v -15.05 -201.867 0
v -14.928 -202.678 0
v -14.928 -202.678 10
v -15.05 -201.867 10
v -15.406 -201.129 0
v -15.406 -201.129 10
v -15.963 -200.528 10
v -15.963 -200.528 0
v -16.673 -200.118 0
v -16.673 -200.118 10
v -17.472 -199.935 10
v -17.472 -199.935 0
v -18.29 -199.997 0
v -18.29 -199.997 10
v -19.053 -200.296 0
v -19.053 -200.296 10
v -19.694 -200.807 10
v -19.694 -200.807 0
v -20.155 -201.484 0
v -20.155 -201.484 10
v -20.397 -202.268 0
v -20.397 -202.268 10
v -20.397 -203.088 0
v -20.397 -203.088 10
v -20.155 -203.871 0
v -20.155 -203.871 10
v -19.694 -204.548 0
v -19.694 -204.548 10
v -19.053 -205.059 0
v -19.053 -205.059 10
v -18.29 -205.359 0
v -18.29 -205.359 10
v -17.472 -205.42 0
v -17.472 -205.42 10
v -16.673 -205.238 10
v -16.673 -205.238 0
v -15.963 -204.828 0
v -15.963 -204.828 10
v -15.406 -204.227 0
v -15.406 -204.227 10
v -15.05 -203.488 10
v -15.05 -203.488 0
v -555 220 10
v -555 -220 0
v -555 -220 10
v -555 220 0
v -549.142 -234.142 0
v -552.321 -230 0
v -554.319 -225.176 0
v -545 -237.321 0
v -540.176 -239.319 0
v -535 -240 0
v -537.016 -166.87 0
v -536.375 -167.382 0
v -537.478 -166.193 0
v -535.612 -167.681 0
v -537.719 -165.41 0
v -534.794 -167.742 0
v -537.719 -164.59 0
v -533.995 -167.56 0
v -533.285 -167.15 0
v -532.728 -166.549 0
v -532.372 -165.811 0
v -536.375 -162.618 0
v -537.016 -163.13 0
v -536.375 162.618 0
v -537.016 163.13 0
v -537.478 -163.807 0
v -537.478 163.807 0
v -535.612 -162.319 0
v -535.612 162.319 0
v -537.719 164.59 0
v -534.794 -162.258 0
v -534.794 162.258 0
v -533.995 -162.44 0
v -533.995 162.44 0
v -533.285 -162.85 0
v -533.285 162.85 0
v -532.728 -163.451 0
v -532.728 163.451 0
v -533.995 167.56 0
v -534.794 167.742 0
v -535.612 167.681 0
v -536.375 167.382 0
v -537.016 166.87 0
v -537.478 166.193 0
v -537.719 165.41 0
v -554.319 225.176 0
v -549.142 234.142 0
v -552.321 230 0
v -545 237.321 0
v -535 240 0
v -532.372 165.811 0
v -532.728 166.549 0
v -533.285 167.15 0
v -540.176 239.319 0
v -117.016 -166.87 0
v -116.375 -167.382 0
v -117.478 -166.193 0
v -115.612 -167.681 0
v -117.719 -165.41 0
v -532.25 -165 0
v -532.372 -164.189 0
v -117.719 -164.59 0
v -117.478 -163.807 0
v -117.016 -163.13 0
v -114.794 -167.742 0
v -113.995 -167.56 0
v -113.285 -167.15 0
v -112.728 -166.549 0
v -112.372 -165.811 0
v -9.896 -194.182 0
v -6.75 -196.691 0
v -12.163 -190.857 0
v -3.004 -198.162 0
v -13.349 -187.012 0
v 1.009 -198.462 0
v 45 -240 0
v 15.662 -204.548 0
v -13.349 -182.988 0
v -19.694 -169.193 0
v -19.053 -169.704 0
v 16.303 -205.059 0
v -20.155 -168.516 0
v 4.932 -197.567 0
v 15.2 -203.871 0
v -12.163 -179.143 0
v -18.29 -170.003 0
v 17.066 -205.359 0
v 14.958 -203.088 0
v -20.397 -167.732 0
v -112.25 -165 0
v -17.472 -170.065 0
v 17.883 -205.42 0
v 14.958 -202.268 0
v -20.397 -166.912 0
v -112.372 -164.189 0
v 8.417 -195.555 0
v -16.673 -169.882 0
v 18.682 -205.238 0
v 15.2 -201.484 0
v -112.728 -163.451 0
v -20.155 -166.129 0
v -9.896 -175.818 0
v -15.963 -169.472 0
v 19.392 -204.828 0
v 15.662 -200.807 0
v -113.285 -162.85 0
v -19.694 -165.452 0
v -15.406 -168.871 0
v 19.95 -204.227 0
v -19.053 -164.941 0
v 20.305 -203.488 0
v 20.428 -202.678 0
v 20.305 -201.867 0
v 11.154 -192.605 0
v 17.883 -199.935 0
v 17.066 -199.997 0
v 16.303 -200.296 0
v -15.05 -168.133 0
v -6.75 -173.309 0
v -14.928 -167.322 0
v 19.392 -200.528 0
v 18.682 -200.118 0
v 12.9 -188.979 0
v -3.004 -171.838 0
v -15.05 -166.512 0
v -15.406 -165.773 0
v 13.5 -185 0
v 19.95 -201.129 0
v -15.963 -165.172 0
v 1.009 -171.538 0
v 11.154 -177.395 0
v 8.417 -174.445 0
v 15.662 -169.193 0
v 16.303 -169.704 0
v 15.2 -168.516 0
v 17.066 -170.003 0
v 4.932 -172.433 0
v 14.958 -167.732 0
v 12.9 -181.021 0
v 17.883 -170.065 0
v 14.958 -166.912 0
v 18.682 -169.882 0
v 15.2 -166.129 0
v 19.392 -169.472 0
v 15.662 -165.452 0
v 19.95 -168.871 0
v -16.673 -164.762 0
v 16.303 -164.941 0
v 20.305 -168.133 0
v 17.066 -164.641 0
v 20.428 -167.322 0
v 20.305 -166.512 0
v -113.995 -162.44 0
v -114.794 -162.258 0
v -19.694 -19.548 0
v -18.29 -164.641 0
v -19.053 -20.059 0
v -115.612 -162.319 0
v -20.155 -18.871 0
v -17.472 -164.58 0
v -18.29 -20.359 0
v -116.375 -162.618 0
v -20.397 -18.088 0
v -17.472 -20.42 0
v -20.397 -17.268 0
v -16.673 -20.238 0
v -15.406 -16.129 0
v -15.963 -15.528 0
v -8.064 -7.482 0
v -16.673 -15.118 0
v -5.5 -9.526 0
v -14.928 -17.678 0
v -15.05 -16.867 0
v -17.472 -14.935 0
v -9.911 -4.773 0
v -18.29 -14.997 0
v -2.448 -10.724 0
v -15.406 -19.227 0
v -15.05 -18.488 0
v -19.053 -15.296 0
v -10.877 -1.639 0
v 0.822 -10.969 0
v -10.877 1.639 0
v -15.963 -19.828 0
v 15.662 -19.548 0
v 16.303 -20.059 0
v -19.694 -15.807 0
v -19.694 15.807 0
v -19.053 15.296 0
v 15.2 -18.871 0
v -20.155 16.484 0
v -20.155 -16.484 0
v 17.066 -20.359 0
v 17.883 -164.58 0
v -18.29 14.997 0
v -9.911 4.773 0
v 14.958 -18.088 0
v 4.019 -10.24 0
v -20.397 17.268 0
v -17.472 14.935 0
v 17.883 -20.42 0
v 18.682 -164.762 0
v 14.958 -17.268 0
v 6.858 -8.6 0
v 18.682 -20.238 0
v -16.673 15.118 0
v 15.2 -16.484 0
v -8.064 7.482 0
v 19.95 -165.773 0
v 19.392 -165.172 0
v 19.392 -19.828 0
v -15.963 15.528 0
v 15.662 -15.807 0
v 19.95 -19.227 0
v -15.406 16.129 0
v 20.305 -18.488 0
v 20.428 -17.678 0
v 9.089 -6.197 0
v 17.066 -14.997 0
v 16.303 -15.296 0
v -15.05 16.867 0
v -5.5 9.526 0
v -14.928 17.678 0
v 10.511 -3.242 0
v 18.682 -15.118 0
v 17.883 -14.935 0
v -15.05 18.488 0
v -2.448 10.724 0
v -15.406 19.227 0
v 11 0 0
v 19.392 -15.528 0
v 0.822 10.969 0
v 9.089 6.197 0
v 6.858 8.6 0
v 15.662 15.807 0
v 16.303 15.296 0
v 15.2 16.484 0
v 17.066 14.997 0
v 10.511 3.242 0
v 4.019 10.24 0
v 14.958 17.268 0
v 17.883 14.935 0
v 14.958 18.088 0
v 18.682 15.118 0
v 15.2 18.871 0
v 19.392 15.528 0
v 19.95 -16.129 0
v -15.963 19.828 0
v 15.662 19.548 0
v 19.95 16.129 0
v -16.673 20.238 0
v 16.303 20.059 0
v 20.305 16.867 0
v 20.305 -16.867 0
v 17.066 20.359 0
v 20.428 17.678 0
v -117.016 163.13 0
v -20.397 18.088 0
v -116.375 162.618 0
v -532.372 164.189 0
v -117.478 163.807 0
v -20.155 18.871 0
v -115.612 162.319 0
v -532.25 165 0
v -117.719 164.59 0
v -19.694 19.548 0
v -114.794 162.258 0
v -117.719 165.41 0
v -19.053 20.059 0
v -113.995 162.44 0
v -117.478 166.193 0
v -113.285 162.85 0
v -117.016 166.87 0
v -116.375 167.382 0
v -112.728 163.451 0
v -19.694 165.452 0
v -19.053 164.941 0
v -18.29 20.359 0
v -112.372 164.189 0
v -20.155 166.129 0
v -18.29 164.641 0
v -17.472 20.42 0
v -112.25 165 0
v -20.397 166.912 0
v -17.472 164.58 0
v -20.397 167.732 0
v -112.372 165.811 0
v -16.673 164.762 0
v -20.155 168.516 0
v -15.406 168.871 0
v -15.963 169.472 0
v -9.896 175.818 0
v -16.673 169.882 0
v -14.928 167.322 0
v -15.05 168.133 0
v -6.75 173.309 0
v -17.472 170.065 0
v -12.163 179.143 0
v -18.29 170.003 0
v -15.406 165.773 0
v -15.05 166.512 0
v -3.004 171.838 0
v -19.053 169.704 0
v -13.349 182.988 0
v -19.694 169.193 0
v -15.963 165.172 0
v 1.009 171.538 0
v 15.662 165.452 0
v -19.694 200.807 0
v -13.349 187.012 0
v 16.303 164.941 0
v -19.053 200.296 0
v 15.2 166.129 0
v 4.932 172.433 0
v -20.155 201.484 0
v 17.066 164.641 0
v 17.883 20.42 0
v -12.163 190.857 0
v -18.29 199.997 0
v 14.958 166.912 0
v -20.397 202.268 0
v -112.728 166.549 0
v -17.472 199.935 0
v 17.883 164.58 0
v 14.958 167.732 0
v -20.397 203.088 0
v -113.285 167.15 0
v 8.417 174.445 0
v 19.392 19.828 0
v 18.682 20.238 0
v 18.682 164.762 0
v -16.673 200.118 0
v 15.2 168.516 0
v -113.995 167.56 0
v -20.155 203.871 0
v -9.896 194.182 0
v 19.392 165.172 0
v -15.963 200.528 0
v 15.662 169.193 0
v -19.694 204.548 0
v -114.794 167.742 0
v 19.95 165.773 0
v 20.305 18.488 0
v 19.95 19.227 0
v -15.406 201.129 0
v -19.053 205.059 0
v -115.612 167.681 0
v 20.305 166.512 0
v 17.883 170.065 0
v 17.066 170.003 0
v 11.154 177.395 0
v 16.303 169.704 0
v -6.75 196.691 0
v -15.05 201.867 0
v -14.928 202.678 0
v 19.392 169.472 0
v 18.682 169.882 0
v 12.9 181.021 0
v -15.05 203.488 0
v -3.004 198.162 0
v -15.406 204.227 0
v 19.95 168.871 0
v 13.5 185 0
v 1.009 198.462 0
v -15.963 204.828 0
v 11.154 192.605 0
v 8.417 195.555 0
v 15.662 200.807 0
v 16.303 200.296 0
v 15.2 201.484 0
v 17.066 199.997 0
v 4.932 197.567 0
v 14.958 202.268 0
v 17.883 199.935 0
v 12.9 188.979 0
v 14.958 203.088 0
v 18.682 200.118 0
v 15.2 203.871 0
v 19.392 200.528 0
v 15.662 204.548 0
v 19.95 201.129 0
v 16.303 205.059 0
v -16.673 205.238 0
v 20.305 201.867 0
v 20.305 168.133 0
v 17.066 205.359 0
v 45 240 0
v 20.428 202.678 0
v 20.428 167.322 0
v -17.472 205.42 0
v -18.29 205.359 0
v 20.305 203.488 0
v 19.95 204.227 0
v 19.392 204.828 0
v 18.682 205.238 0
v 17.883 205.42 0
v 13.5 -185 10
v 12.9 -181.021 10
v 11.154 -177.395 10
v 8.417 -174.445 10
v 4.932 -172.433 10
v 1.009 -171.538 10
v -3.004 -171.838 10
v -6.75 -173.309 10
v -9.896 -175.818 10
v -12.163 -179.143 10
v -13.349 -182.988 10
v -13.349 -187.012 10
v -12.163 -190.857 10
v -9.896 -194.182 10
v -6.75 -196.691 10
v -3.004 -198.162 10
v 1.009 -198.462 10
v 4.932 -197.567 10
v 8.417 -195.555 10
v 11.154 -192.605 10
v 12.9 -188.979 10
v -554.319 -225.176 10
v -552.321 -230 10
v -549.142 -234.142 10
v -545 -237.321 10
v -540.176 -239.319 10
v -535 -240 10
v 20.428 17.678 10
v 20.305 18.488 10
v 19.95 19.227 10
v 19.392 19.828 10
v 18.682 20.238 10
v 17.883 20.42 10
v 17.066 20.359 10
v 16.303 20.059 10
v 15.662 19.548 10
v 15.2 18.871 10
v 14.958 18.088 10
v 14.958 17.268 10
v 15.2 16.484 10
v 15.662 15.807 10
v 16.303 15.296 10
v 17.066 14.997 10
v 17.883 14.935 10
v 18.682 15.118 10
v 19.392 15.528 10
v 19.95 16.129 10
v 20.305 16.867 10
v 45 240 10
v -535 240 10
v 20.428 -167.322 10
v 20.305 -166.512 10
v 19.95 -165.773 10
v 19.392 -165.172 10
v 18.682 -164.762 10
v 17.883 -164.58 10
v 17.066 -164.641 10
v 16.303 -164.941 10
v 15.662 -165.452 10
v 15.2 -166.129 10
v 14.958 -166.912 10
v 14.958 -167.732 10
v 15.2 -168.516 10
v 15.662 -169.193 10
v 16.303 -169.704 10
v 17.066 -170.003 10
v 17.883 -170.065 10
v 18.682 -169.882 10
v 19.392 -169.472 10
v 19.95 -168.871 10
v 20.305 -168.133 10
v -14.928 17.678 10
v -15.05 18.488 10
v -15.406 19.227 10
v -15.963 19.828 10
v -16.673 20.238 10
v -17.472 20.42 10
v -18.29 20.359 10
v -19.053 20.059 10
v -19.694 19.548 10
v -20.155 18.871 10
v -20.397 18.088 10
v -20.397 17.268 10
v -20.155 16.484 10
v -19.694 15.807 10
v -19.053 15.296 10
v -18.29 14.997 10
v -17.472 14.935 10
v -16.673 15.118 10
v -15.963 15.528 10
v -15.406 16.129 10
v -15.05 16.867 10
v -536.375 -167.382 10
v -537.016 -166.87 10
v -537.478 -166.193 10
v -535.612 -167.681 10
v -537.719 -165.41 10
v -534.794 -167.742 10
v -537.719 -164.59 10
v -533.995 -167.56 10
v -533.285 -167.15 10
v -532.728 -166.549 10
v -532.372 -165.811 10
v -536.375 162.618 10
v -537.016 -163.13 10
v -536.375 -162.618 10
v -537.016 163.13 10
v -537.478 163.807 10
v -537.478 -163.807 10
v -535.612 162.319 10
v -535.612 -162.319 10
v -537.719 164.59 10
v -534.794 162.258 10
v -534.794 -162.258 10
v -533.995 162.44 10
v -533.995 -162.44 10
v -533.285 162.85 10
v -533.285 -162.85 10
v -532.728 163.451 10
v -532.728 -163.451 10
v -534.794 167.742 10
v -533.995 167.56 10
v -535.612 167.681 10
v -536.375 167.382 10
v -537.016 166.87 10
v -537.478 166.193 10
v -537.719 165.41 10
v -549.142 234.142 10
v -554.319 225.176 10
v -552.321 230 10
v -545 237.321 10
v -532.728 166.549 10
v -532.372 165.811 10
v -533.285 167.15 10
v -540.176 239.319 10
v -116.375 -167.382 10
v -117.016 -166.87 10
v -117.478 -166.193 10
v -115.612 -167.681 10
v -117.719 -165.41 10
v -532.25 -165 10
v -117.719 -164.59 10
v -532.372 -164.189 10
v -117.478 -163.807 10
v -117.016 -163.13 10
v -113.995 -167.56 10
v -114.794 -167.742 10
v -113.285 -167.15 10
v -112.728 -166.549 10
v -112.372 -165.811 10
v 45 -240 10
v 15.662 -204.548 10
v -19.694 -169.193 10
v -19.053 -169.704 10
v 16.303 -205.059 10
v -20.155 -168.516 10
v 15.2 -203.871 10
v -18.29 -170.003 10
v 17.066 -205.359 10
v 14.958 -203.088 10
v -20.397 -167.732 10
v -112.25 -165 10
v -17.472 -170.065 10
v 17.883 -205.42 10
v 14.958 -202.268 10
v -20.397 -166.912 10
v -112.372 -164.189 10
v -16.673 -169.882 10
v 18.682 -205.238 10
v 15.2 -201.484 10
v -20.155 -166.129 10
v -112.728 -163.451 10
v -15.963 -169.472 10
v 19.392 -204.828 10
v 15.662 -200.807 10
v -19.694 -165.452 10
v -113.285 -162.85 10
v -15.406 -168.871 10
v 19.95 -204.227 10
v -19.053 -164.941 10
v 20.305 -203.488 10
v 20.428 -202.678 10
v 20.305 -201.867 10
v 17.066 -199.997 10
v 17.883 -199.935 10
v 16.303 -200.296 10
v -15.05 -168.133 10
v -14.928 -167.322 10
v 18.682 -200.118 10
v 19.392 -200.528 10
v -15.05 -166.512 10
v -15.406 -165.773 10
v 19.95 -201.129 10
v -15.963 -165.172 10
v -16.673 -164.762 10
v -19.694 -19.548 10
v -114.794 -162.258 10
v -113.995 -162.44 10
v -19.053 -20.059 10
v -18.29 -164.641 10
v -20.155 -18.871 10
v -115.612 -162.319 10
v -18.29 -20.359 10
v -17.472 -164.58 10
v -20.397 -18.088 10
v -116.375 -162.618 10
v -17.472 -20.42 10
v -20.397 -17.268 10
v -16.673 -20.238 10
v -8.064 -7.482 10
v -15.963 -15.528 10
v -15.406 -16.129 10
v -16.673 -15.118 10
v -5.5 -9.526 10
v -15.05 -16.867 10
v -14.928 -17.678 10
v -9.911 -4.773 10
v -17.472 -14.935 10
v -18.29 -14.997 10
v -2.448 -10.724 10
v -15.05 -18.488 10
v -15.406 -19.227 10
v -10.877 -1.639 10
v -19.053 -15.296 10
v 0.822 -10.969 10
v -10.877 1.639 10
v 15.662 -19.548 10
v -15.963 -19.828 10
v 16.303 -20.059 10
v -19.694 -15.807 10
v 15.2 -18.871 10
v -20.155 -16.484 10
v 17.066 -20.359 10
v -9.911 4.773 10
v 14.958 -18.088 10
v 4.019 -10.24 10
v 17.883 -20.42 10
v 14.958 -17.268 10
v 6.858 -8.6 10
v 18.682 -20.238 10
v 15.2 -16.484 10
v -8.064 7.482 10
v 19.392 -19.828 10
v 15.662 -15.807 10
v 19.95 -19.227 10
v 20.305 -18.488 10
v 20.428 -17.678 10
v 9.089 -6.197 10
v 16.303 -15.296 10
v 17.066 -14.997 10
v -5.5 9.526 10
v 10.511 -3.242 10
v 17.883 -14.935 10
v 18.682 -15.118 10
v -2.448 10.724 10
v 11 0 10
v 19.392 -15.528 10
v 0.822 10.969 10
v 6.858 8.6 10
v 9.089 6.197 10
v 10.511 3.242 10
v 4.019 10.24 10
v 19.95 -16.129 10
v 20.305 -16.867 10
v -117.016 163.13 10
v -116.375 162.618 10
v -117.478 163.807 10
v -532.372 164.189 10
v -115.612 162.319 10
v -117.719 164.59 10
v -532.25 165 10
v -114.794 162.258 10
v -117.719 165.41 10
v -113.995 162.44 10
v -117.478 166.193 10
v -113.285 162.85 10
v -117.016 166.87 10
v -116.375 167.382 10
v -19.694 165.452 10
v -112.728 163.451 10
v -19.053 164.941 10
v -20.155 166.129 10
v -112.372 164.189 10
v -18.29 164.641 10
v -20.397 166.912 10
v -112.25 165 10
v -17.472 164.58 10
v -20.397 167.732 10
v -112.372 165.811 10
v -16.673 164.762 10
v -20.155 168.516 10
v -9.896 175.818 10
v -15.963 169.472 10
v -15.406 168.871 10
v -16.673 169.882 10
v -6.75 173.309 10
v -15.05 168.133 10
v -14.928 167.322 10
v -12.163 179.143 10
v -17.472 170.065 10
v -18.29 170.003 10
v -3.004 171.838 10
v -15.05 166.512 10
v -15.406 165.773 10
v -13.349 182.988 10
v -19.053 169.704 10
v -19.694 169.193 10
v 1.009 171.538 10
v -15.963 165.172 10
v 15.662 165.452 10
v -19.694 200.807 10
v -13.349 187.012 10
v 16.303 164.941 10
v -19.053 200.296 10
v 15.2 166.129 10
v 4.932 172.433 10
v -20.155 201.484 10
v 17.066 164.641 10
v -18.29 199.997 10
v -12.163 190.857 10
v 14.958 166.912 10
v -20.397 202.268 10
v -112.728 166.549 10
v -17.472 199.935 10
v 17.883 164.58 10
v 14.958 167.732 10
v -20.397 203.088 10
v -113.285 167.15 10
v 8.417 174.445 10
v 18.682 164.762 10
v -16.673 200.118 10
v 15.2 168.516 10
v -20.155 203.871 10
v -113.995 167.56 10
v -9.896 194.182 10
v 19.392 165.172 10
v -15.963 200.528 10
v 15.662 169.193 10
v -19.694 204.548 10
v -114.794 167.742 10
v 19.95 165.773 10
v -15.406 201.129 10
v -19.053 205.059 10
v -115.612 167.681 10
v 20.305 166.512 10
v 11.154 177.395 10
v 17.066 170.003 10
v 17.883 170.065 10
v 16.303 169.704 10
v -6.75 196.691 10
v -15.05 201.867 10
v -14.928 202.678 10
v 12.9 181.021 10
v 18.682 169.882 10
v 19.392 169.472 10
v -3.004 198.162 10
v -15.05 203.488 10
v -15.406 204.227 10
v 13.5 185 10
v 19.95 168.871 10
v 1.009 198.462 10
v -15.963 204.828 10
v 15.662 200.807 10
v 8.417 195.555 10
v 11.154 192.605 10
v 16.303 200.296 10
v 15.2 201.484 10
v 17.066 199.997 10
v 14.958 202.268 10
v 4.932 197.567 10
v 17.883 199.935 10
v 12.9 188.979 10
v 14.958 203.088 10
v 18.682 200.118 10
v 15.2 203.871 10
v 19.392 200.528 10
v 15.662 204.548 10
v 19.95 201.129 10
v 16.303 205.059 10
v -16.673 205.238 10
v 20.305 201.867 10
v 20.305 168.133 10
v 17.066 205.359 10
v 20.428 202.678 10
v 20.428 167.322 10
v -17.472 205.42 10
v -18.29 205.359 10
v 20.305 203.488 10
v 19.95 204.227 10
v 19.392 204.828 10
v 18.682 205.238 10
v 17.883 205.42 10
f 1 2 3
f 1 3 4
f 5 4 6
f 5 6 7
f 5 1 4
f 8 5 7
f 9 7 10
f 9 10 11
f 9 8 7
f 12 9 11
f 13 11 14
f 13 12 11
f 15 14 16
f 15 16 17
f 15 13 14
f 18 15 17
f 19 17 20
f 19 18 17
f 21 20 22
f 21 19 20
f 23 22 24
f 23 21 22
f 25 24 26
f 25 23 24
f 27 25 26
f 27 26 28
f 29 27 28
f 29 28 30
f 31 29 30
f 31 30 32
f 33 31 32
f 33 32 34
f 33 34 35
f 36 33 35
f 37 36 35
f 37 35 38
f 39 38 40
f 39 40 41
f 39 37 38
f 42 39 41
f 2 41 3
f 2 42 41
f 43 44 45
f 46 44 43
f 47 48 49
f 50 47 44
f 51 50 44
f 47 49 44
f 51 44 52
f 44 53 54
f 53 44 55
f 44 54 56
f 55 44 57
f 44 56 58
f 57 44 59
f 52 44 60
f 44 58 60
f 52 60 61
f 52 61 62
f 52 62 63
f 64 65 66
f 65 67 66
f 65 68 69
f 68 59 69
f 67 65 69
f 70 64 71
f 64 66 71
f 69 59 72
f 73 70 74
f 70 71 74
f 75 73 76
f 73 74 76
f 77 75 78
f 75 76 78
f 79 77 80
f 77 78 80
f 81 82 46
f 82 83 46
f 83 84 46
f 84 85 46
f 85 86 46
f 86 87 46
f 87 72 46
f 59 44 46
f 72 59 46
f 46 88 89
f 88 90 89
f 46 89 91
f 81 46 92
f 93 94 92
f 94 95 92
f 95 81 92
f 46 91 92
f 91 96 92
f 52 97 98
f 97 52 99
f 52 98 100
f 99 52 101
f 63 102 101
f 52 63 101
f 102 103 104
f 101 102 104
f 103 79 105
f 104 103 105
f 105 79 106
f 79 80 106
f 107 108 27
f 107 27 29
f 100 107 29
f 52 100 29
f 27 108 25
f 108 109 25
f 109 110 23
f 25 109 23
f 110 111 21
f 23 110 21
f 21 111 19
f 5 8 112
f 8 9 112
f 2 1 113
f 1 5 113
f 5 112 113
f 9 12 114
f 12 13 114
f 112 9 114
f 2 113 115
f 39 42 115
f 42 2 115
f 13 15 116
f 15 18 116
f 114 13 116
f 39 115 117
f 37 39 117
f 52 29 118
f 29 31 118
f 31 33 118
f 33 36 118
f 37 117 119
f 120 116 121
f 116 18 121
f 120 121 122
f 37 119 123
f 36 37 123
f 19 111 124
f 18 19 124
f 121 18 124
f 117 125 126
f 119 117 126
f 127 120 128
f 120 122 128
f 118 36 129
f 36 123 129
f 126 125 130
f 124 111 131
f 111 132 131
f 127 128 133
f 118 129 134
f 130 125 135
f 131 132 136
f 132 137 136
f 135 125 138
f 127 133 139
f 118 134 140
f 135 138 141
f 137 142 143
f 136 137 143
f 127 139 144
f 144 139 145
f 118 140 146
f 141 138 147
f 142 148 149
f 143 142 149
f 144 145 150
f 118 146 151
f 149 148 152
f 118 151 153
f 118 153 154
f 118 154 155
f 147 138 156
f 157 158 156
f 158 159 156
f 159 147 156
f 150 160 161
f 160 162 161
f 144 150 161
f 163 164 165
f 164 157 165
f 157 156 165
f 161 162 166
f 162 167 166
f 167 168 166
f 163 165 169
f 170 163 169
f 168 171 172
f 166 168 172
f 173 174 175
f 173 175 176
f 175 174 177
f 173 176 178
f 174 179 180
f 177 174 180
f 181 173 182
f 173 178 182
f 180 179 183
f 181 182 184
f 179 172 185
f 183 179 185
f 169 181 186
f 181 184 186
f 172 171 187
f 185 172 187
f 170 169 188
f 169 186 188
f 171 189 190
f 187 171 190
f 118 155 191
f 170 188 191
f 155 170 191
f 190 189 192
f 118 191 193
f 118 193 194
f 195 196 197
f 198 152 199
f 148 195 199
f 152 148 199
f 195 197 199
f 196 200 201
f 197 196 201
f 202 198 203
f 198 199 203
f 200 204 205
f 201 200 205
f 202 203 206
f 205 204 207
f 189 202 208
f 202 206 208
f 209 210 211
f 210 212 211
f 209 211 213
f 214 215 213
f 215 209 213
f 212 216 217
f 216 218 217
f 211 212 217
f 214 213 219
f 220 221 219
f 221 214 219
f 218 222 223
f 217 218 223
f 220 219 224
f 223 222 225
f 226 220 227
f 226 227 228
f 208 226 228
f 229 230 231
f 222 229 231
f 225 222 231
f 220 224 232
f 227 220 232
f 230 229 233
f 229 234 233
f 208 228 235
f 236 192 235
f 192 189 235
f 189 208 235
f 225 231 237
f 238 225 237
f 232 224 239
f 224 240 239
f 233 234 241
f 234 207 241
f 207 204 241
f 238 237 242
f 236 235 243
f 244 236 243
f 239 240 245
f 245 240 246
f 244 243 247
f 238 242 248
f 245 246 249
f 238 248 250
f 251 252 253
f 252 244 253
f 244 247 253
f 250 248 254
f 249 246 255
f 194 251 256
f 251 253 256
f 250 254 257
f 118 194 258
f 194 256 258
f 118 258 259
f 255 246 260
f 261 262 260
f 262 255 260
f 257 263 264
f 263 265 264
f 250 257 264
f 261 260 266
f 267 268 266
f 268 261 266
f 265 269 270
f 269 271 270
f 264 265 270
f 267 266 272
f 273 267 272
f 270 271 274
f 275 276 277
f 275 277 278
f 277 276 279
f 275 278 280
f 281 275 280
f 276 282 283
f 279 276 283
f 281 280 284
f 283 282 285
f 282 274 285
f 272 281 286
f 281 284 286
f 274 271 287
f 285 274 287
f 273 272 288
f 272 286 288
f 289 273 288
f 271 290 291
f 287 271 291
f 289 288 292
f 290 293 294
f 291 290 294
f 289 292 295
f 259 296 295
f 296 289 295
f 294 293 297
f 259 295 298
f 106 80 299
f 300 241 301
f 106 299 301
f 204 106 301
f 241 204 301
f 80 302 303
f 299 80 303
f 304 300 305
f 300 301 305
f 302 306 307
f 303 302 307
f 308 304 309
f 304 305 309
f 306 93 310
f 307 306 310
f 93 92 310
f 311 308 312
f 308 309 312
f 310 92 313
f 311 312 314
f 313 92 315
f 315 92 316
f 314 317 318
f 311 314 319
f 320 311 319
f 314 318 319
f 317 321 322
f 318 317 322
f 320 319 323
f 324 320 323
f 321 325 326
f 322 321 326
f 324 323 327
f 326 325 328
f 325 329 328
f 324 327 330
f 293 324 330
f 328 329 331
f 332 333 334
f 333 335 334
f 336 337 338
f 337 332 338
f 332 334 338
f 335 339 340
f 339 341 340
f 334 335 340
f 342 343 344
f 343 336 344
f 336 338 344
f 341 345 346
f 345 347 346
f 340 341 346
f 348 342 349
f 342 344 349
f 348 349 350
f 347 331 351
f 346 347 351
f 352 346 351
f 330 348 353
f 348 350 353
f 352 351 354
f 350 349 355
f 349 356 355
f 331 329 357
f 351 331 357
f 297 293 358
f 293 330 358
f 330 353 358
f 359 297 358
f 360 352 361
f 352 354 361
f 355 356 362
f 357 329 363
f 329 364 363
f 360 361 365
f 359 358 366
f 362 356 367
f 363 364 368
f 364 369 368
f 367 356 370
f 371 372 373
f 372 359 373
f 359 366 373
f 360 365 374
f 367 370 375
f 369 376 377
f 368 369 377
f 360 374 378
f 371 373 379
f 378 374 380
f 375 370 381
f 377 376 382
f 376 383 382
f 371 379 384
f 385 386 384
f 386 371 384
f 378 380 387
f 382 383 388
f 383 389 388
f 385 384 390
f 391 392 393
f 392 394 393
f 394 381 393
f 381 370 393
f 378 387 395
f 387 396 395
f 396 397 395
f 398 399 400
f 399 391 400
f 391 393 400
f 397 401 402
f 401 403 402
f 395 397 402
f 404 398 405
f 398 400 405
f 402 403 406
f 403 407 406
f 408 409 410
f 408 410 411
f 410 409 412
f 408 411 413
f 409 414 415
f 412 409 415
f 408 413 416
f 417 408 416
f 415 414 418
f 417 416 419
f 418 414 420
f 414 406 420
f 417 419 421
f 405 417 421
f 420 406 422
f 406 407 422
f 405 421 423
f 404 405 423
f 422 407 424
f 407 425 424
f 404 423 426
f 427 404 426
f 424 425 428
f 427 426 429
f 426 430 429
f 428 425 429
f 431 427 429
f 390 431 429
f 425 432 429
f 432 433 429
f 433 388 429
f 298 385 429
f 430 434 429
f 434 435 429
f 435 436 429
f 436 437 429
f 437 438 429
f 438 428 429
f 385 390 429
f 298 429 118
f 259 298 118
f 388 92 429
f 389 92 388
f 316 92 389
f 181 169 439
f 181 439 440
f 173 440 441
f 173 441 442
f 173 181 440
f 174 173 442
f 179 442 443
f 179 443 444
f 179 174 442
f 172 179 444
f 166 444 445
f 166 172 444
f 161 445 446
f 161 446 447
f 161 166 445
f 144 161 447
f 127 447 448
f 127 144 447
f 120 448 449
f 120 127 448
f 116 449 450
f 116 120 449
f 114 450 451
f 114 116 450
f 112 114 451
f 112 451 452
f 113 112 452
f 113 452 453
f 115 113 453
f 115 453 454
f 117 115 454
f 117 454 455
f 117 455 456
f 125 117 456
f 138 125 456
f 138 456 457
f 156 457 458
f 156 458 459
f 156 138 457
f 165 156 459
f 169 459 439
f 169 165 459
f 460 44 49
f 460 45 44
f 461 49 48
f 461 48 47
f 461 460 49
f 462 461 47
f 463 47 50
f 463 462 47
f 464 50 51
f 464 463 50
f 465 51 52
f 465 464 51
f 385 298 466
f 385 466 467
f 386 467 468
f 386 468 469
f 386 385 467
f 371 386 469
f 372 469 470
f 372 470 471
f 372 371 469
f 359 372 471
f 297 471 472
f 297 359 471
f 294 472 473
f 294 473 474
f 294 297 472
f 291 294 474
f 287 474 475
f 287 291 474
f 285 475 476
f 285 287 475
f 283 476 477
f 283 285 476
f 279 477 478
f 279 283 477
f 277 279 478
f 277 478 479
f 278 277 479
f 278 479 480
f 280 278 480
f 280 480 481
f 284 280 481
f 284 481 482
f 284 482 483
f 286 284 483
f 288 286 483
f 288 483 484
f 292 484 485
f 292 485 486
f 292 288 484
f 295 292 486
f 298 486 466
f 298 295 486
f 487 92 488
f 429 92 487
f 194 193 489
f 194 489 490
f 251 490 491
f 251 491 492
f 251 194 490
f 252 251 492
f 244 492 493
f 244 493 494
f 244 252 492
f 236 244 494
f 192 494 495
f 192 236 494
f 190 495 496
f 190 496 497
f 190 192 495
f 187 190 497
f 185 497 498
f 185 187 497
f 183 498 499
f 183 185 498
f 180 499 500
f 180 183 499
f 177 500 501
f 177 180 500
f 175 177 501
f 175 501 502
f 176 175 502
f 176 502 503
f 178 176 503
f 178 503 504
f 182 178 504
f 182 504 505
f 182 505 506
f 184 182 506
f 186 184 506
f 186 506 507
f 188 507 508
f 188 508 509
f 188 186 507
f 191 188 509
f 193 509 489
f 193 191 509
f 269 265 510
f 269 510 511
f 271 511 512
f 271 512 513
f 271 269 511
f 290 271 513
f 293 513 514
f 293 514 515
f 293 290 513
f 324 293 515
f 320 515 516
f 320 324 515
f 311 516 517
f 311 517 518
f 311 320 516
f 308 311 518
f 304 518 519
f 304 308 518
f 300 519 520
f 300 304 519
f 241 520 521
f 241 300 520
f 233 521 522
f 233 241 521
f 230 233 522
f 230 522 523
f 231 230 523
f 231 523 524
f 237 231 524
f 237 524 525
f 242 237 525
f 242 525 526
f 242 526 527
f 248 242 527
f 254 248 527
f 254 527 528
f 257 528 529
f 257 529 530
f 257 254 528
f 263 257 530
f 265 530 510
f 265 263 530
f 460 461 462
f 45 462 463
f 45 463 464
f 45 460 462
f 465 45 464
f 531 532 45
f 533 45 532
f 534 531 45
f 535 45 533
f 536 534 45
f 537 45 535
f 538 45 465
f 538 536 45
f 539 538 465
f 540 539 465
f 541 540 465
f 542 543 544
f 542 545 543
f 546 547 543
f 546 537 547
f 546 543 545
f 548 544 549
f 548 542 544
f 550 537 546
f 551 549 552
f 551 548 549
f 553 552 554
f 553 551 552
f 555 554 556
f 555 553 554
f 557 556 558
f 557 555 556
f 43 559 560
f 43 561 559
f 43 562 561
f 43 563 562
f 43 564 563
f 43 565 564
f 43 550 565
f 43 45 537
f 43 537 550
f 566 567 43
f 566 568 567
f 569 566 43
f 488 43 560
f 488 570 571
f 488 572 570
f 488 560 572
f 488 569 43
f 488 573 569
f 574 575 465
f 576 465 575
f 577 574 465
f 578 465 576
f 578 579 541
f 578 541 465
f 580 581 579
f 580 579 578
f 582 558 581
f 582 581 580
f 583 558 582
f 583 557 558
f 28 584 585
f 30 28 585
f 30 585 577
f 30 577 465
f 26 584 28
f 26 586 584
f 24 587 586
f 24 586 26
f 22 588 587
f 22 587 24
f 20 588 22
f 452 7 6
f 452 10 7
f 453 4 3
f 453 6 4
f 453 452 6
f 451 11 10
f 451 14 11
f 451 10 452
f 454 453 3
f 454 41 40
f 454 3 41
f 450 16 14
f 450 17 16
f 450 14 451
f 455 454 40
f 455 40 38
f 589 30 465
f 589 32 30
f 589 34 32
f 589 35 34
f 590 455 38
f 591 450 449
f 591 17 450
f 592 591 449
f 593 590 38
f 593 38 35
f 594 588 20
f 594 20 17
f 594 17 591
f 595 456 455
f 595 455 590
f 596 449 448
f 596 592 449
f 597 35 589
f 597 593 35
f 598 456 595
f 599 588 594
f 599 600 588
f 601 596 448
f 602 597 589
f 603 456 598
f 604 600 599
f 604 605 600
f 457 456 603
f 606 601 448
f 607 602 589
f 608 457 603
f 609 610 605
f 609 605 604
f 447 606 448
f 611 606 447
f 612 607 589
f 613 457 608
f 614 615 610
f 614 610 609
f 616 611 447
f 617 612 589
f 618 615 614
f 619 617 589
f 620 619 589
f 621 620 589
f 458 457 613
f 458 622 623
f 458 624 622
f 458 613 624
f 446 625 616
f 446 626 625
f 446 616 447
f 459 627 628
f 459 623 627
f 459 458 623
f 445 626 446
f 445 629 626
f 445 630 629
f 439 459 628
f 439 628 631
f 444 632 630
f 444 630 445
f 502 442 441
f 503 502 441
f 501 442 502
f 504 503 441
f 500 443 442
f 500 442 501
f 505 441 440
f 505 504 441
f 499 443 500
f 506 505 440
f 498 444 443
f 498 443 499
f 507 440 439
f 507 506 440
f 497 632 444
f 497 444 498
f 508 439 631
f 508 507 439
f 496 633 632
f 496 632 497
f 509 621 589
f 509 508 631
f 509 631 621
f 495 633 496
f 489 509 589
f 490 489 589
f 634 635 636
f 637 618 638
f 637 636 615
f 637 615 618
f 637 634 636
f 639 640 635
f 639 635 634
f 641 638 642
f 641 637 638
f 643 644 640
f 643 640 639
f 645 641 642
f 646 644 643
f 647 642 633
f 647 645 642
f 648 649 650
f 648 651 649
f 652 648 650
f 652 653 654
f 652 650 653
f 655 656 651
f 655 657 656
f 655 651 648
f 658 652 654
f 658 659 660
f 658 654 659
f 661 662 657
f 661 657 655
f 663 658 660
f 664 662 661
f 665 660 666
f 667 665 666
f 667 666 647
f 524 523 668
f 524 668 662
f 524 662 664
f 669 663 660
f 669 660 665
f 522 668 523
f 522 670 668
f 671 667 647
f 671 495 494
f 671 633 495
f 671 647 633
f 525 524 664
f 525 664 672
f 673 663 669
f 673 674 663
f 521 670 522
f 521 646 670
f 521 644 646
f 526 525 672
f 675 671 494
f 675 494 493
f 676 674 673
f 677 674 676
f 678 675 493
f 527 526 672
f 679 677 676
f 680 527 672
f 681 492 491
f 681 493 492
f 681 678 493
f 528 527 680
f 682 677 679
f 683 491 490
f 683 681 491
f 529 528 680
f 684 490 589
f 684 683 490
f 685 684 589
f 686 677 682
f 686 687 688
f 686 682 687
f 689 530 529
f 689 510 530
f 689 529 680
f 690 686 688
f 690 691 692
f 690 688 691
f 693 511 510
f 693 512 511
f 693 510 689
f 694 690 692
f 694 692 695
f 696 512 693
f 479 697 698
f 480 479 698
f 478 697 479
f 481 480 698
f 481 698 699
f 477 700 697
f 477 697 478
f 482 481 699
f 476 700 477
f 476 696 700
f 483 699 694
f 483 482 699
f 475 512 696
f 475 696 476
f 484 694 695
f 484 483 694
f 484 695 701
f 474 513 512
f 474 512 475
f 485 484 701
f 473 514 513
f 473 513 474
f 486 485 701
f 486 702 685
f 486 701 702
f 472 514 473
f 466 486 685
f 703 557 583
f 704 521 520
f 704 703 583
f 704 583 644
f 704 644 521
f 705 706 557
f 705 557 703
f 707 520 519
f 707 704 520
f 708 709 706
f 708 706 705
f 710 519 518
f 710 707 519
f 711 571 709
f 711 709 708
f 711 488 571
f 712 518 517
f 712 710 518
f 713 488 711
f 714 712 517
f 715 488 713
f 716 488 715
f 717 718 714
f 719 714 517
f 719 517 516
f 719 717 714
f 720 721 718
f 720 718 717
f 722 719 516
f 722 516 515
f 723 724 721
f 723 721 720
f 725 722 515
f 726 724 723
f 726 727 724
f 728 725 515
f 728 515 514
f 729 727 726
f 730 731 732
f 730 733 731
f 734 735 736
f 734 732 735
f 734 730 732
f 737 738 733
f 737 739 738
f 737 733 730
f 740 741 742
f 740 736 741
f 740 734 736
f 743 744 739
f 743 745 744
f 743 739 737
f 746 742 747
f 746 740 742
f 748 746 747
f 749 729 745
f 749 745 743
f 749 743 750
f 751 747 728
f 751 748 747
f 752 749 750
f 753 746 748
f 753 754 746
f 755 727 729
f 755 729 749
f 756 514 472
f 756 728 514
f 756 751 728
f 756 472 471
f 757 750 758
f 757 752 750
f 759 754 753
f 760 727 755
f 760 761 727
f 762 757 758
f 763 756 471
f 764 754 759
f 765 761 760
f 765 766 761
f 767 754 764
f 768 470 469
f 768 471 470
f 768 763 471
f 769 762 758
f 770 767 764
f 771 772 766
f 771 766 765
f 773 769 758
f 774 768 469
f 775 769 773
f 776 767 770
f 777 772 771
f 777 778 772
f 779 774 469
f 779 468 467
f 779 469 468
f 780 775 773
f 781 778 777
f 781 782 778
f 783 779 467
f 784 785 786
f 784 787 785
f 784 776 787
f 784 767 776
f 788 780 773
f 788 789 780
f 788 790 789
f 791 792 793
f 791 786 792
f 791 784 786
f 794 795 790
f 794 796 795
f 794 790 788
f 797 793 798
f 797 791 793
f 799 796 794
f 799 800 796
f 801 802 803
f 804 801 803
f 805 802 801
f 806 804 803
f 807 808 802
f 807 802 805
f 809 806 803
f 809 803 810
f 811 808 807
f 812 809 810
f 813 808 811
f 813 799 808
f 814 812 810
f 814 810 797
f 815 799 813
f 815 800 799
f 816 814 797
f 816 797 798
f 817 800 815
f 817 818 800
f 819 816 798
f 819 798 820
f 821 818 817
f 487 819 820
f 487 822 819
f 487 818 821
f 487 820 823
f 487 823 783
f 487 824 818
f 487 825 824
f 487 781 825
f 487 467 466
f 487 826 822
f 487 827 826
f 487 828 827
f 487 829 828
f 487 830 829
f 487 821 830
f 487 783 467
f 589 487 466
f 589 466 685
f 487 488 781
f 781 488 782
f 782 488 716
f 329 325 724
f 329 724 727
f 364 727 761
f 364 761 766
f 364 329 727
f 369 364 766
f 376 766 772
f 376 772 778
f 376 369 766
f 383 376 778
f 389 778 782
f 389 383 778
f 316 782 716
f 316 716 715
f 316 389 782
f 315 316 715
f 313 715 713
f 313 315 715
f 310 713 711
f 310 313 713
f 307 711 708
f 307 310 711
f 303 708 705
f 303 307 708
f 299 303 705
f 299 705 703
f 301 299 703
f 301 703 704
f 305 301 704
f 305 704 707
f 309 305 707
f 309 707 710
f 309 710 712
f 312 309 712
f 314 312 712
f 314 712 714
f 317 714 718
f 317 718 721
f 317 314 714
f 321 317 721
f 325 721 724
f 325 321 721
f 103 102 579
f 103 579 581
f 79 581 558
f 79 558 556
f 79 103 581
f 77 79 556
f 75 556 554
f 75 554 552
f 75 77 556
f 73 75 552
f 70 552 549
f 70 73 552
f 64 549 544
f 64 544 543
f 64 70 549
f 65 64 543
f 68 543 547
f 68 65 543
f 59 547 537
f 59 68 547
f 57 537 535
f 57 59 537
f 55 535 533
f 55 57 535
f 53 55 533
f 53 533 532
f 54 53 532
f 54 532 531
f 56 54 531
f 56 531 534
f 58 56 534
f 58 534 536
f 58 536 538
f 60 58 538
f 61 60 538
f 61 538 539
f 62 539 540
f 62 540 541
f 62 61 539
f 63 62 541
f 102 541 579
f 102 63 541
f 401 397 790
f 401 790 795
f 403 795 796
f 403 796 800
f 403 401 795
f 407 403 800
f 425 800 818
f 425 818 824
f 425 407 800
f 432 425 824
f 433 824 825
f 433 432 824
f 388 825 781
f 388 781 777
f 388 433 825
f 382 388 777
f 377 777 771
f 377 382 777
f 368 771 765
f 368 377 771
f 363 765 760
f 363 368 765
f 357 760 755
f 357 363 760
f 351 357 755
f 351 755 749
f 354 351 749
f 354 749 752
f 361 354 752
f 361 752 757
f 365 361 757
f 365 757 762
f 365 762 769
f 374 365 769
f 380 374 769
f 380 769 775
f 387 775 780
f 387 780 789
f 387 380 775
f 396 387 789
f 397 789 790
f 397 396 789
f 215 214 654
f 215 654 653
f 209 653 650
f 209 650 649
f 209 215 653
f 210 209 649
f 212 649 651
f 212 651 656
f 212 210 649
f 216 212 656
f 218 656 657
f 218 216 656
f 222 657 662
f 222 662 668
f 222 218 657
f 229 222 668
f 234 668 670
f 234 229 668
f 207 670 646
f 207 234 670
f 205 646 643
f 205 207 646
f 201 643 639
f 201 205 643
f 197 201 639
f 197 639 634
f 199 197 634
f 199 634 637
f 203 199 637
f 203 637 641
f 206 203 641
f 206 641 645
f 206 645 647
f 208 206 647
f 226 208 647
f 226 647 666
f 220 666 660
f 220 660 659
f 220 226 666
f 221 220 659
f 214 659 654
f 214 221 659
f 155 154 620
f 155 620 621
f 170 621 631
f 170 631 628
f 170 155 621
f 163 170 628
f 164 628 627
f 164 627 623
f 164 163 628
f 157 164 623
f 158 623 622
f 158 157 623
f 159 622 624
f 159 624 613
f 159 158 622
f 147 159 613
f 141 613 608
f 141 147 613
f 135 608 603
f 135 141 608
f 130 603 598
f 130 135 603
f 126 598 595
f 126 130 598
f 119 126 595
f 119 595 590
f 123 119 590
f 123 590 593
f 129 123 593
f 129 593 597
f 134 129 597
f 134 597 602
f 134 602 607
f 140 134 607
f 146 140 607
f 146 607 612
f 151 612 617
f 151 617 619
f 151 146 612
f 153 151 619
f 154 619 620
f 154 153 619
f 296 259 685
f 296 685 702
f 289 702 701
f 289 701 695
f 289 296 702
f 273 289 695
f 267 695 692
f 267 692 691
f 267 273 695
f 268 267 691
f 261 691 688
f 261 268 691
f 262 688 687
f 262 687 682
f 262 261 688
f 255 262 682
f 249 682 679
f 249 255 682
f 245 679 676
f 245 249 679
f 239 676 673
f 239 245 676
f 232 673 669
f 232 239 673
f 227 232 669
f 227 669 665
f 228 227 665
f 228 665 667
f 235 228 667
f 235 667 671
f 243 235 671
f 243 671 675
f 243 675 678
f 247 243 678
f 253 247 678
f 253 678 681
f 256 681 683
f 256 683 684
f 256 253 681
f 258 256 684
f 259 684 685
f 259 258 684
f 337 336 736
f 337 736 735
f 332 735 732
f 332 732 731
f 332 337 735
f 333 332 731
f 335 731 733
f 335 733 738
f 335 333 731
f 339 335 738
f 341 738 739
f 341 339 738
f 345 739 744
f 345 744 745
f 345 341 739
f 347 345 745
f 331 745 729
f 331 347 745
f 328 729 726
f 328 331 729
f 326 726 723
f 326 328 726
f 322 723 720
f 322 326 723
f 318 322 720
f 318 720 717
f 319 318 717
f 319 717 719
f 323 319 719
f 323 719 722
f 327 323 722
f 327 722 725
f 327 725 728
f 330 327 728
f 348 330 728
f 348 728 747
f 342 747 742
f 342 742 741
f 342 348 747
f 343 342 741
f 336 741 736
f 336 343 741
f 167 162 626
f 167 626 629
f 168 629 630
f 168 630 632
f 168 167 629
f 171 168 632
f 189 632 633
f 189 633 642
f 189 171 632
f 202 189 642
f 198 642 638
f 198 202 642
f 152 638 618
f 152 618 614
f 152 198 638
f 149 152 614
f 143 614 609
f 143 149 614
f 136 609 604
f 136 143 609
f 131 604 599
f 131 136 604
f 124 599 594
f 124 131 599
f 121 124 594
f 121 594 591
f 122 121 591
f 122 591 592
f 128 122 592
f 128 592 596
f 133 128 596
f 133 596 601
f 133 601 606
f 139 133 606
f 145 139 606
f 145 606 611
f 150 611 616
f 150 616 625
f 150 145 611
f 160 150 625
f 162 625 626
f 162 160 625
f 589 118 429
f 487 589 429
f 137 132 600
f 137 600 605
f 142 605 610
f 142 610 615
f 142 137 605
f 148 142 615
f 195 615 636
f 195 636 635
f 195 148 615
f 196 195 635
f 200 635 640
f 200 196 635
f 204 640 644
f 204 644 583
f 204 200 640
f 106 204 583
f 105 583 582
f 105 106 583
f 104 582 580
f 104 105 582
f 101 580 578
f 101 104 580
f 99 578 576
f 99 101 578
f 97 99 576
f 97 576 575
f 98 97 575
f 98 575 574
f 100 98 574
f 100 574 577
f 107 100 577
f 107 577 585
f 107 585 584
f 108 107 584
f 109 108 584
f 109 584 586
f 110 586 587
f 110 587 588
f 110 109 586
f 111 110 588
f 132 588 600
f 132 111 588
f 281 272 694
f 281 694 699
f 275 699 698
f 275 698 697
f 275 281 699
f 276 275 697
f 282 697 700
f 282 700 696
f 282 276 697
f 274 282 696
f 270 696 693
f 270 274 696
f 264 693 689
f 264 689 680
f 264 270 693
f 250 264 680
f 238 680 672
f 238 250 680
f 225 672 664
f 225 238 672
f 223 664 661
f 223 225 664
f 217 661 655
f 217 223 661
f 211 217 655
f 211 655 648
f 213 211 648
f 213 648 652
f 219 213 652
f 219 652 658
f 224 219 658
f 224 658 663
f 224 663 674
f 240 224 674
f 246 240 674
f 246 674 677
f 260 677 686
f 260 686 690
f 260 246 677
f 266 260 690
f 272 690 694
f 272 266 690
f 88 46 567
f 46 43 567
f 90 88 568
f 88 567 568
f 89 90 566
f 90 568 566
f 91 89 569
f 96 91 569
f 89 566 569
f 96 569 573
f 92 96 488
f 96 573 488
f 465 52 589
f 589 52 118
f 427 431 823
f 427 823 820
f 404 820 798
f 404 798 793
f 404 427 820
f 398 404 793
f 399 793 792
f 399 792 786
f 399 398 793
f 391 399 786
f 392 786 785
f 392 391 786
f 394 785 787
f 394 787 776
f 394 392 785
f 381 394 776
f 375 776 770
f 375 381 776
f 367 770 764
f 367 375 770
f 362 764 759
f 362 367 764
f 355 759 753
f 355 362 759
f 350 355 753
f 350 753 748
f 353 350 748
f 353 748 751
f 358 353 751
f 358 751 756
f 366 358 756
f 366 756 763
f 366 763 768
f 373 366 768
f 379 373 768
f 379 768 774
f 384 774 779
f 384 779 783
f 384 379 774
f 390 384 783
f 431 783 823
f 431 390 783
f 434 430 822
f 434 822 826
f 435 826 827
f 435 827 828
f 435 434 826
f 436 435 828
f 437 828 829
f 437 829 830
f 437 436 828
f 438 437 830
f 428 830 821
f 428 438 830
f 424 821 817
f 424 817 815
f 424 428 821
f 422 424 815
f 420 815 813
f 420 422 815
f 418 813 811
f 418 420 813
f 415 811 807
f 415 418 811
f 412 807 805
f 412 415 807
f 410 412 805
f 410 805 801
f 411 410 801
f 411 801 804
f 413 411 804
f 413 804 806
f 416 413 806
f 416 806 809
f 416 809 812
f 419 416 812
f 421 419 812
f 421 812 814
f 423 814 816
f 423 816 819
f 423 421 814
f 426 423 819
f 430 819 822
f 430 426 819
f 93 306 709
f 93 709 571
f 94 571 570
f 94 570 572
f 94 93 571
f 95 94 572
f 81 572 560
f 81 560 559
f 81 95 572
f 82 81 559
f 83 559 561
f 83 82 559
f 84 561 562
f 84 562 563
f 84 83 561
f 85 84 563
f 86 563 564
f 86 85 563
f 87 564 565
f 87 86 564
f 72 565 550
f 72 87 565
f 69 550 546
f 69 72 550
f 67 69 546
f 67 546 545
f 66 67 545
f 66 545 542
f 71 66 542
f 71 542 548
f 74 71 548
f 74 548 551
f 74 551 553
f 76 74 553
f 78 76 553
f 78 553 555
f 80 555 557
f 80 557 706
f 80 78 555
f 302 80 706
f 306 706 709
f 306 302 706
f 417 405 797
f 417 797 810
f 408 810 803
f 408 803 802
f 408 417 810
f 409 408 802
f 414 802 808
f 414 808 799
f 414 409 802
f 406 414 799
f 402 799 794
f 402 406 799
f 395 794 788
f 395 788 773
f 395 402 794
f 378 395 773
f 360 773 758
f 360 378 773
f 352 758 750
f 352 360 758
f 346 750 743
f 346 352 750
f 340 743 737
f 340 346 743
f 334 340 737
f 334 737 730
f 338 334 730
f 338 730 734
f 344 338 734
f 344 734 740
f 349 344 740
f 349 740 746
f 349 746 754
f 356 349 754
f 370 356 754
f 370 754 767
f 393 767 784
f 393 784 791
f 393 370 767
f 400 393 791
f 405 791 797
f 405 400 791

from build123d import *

# Parameters (mm, degrees)
SKETCH_1_W      = 600
SKETCH_1_H      = 480
SKETCH_1_R      = 2.75
SKETCH_1_R_2    = 13.5
SKETCH_1_R_3    = 11
EXTRUDE_1_DEPTH = 10
FILLET_1_R      = 20


with BuildPart() as part:
    # Эскиз1 → Бобышка-Вытянуть1 (new body)
    with BuildSketch(Plane.XY):
        with Locations((-255, 0)):
            Rectangle(SKETCH_1_W, SKETCH_1_H)
        with Locations((-535, -165)):
            Circle(SKETCH_1_R, mode=Mode.SUBTRACT)
        with Locations((-115, -165)):
            Circle(SKETCH_1_R, mode=Mode.SUBTRACT)
        with Locations((-17.67766953, -202.67766953)):
            Circle(SKETCH_1_R, mode=Mode.SUBTRACT)
        with Locations((0, -185)):
            Circle(SKETCH_1_R_2, mode=Mode.SUBTRACT)
        with Locations((17.67766953, -202.67766953)):
            Circle(SKETCH_1_R, mode=Mode.SUBTRACT)
        with Locations((-17.67766953, -167.32233047)):
            Circle(SKETCH_1_R, mode=Mode.SUBTRACT)
        with Locations((17.67766953, -167.32233047)):
            Circle(SKETCH_1_R, mode=Mode.SUBTRACT)
        with Locations((-17.67766953, -17.67766953)):
            Circle(SKETCH_1_R, mode=Mode.SUBTRACT)
        with Locations((17.67766953, -17.67766953)):
            Circle(SKETCH_1_R, mode=Mode.SUBTRACT)
        with Locations((-535, 165)):
            Circle(SKETCH_1_R, mode=Mode.SUBTRACT)
        Circle(SKETCH_1_R_3, mode=Mode.SUBTRACT)
        with Locations((-17.67766953, 17.67766953)):
            Circle(SKETCH_1_R, mode=Mode.SUBTRACT)
        with Locations((17.67766953, 17.67766953)):
            Circle(SKETCH_1_R, mode=Mode.SUBTRACT)
        with Locations((-115, 165)):
            Circle(SKETCH_1_R, mode=Mode.SUBTRACT)
        with Locations((-17.67766953, 167.32233047)):
            Circle(SKETCH_1_R, mode=Mode.SUBTRACT)
        with Locations((17.67766953, 167.32233047)):
            Circle(SKETCH_1_R, mode=Mode.SUBTRACT)
        with Locations((0, 185)):
            Circle(SKETCH_1_R_2, mode=Mode.SUBTRACT)
        with Locations((-17.67766953, 202.67766953)):
            Circle(SKETCH_1_R, mode=Mode.SUBTRACT)
        with Locations((17.67766953, 202.67766953)):
            Circle(SKETCH_1_R, mode=Mode.SUBTRACT)
    extrude(amount=EXTRUDE_1_DEPTH)

    # Скругление1
    fillet_1_edges = [part.edges().sort_by_distance(p)[0] for p in [
        (-555, 240, 5),
        (-555, -240, 5),
    ]]
    fillet(fillet_1_edges, radius=FILLET_1_R)


solid = part.part
